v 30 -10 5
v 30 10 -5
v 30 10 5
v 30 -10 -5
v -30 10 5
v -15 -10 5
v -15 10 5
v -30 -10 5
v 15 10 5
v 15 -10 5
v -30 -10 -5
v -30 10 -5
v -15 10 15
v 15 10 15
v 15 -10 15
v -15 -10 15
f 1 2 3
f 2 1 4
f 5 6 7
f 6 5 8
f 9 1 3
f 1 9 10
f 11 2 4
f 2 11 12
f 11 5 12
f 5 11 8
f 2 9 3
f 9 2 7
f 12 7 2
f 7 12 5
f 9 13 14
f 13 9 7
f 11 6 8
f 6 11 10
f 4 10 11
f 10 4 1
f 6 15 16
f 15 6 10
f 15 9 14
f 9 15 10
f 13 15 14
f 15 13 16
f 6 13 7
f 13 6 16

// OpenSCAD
// (width,depth,height)
// a small overlap as a tolerance  
// of about 0.001 - 0.002 units
// using a third cube
/*
When two objects are exactly touching each other, you should always guarantee a small overlap by subtracting or adding a tolerance of 0.001 units. 
*/
cube([60,20,10],center=true);
translate([0, 0, 10])
    cube([30,20,10],center=true);
translate([0,0,10-0.002])
    cube([30,20,0.002],true);
